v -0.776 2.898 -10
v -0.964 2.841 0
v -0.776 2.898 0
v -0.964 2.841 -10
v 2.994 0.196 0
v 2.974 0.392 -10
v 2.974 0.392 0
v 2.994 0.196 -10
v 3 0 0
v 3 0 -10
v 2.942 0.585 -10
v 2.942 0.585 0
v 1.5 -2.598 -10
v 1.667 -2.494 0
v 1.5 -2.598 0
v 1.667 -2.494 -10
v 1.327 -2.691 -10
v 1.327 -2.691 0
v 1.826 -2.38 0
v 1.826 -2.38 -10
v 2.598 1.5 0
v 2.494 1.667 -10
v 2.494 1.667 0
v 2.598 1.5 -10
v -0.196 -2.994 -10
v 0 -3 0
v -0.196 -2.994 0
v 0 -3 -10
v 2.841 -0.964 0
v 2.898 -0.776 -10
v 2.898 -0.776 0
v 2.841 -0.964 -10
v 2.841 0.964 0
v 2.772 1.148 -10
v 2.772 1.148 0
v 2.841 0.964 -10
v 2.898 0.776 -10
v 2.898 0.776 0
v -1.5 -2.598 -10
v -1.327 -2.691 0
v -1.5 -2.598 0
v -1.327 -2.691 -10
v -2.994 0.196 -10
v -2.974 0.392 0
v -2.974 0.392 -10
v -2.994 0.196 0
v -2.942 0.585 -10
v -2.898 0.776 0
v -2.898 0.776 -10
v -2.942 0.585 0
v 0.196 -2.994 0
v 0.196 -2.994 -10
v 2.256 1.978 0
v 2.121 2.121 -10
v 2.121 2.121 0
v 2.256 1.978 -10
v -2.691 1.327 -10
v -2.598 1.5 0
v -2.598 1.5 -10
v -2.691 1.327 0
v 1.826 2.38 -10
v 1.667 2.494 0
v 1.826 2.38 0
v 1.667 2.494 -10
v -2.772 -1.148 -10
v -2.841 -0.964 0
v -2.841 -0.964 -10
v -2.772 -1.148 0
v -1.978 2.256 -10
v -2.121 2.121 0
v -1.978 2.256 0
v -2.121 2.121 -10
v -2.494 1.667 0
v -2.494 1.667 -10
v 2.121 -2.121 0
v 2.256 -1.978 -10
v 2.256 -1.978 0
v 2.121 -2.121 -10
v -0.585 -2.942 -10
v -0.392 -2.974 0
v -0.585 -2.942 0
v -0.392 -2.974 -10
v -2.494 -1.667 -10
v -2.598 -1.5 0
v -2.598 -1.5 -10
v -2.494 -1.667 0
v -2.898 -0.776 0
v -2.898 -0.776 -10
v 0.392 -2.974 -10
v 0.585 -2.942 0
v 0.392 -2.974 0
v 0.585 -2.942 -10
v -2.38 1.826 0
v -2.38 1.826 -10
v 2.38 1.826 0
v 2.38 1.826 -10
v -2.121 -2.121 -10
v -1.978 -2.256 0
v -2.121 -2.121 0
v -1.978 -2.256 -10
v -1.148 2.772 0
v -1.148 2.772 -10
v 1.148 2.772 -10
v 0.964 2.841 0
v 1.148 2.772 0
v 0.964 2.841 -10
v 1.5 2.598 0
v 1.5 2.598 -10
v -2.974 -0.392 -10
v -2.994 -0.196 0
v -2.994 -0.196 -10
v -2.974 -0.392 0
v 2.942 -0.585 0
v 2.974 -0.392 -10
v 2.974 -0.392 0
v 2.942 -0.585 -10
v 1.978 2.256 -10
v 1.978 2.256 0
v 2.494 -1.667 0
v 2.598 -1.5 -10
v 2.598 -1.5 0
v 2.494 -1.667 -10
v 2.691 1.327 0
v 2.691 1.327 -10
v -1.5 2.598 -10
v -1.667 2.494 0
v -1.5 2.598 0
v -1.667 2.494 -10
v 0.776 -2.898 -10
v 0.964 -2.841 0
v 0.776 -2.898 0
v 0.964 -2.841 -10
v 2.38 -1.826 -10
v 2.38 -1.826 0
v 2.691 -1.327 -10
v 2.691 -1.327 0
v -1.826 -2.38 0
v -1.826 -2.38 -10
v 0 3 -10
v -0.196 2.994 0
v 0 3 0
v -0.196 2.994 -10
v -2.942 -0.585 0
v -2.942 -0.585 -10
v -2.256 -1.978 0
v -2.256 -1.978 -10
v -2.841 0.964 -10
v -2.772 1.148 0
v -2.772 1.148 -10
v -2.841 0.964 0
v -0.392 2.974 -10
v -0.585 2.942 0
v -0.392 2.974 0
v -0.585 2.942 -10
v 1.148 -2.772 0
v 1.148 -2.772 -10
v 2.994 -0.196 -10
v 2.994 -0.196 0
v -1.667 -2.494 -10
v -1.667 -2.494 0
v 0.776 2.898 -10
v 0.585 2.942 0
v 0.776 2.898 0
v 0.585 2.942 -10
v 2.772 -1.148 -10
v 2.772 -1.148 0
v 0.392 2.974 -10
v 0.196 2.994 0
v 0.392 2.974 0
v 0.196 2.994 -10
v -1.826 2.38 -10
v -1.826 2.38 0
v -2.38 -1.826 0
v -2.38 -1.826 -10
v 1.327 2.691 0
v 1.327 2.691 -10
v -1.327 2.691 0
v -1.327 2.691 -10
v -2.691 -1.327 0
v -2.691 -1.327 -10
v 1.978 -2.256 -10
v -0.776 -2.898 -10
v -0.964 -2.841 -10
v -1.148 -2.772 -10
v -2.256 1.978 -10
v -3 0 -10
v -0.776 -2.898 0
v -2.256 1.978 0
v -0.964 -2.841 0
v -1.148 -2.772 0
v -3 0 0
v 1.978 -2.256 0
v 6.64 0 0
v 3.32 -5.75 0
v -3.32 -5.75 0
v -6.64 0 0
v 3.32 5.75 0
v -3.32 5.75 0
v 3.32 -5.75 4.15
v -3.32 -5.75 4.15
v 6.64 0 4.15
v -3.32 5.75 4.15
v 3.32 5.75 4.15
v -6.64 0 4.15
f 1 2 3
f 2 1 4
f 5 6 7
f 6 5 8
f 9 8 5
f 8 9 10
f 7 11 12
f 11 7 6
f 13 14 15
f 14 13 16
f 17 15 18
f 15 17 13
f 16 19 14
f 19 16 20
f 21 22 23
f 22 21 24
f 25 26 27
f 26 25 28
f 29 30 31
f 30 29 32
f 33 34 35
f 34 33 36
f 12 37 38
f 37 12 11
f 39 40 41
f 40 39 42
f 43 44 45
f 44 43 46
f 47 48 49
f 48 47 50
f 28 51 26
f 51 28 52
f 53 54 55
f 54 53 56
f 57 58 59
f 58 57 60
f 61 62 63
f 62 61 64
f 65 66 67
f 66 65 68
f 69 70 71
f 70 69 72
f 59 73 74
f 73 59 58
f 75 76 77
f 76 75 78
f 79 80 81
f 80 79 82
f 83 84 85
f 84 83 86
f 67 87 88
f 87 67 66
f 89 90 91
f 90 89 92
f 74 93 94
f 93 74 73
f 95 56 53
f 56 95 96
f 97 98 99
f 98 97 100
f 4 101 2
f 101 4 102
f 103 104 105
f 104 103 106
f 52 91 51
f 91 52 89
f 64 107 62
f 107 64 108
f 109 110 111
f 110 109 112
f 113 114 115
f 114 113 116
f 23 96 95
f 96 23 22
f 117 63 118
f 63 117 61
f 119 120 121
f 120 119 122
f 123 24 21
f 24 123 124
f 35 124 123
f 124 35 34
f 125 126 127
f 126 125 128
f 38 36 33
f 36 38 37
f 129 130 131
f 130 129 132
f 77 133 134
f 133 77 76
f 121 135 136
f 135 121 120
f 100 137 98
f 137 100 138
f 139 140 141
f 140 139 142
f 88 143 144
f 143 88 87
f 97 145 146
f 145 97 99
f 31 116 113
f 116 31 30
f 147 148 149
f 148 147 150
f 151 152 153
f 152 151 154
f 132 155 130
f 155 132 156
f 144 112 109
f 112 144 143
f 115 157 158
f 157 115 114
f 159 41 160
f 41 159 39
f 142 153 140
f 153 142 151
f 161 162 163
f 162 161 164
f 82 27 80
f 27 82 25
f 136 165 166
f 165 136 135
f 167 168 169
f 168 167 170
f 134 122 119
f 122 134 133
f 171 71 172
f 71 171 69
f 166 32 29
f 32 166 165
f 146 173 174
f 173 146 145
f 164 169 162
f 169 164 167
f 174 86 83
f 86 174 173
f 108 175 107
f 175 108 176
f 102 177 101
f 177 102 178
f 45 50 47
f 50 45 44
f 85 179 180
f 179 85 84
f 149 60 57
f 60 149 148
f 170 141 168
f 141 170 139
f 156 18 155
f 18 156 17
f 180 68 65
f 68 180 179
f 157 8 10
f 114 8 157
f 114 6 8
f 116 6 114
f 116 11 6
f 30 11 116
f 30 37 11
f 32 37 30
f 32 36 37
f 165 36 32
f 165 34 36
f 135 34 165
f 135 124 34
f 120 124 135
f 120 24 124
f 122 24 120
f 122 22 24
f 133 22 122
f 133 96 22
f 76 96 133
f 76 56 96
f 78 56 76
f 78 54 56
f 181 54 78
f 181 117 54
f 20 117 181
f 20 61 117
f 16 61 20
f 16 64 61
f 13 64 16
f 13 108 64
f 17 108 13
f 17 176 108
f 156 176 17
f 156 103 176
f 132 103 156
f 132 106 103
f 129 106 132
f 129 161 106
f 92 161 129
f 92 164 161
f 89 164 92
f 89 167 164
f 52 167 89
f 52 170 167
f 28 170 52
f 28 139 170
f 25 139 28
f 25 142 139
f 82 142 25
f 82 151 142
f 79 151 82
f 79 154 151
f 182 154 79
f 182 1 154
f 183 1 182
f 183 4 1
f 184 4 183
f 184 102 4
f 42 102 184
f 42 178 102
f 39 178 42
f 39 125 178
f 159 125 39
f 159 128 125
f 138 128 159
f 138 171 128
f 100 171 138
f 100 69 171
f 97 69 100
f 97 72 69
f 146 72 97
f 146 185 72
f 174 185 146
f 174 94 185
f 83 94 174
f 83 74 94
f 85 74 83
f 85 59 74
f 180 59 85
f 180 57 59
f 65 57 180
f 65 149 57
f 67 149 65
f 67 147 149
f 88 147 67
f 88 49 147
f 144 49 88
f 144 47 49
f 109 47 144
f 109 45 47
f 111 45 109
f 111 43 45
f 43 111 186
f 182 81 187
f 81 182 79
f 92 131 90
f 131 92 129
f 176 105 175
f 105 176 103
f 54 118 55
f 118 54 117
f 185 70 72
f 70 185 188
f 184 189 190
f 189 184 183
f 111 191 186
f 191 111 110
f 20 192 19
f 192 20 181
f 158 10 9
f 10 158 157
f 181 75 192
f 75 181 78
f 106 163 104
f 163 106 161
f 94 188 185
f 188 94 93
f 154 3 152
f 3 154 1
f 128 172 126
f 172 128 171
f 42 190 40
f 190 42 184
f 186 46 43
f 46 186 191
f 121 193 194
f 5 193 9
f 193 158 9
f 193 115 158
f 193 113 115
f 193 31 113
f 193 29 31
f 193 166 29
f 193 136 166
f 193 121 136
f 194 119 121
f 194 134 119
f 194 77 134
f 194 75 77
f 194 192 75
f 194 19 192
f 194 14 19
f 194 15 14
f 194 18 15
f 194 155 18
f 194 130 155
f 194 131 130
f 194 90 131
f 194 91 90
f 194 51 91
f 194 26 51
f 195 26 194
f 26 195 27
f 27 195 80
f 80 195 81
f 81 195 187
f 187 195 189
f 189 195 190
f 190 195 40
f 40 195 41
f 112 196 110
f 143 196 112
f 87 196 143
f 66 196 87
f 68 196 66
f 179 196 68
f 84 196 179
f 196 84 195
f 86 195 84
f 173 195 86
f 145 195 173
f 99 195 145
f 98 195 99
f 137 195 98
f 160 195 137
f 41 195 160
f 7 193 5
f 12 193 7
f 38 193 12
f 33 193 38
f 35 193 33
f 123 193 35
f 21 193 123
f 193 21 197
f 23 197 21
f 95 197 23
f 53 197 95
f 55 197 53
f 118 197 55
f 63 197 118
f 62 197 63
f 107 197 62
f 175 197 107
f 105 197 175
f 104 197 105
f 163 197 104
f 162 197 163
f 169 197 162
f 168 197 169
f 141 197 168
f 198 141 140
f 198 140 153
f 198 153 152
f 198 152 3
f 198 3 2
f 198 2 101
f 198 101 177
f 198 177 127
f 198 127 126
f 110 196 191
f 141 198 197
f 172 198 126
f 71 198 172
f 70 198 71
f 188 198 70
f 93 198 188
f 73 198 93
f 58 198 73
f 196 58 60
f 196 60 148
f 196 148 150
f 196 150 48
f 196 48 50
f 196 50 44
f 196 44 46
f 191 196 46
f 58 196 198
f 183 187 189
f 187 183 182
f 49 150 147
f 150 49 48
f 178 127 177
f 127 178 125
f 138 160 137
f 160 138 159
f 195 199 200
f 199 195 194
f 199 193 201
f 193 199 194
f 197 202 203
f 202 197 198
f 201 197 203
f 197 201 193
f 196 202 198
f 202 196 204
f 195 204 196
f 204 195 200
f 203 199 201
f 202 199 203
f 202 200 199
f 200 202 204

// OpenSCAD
$fn=96;

// Dimensions (mm)
shaft_d = 6.0;
shaft_r = shaft_d/2;

head_flat_d = 11.5;          // across flats
head_h = 4.15;

length_under_head = 10.0;    // shaft length (excluding head)

// Helpers
module hex_prism(af, h){
    // Regular hexagon: across flats = 2*apothem
    // For a regular hexagon, circumradius R = af / sqrt(3)
    R = af / sqrt(3);
    cylinder(h=h, r=R, $fn=6);
}

union() {
    // Shaft (under head)
    translate([0,0,-length_under_head])
        cylinder(h=length_under_head, r=shaft_r);

    // Hex head
    hex_prism(head_flat_d, head_h);
}
